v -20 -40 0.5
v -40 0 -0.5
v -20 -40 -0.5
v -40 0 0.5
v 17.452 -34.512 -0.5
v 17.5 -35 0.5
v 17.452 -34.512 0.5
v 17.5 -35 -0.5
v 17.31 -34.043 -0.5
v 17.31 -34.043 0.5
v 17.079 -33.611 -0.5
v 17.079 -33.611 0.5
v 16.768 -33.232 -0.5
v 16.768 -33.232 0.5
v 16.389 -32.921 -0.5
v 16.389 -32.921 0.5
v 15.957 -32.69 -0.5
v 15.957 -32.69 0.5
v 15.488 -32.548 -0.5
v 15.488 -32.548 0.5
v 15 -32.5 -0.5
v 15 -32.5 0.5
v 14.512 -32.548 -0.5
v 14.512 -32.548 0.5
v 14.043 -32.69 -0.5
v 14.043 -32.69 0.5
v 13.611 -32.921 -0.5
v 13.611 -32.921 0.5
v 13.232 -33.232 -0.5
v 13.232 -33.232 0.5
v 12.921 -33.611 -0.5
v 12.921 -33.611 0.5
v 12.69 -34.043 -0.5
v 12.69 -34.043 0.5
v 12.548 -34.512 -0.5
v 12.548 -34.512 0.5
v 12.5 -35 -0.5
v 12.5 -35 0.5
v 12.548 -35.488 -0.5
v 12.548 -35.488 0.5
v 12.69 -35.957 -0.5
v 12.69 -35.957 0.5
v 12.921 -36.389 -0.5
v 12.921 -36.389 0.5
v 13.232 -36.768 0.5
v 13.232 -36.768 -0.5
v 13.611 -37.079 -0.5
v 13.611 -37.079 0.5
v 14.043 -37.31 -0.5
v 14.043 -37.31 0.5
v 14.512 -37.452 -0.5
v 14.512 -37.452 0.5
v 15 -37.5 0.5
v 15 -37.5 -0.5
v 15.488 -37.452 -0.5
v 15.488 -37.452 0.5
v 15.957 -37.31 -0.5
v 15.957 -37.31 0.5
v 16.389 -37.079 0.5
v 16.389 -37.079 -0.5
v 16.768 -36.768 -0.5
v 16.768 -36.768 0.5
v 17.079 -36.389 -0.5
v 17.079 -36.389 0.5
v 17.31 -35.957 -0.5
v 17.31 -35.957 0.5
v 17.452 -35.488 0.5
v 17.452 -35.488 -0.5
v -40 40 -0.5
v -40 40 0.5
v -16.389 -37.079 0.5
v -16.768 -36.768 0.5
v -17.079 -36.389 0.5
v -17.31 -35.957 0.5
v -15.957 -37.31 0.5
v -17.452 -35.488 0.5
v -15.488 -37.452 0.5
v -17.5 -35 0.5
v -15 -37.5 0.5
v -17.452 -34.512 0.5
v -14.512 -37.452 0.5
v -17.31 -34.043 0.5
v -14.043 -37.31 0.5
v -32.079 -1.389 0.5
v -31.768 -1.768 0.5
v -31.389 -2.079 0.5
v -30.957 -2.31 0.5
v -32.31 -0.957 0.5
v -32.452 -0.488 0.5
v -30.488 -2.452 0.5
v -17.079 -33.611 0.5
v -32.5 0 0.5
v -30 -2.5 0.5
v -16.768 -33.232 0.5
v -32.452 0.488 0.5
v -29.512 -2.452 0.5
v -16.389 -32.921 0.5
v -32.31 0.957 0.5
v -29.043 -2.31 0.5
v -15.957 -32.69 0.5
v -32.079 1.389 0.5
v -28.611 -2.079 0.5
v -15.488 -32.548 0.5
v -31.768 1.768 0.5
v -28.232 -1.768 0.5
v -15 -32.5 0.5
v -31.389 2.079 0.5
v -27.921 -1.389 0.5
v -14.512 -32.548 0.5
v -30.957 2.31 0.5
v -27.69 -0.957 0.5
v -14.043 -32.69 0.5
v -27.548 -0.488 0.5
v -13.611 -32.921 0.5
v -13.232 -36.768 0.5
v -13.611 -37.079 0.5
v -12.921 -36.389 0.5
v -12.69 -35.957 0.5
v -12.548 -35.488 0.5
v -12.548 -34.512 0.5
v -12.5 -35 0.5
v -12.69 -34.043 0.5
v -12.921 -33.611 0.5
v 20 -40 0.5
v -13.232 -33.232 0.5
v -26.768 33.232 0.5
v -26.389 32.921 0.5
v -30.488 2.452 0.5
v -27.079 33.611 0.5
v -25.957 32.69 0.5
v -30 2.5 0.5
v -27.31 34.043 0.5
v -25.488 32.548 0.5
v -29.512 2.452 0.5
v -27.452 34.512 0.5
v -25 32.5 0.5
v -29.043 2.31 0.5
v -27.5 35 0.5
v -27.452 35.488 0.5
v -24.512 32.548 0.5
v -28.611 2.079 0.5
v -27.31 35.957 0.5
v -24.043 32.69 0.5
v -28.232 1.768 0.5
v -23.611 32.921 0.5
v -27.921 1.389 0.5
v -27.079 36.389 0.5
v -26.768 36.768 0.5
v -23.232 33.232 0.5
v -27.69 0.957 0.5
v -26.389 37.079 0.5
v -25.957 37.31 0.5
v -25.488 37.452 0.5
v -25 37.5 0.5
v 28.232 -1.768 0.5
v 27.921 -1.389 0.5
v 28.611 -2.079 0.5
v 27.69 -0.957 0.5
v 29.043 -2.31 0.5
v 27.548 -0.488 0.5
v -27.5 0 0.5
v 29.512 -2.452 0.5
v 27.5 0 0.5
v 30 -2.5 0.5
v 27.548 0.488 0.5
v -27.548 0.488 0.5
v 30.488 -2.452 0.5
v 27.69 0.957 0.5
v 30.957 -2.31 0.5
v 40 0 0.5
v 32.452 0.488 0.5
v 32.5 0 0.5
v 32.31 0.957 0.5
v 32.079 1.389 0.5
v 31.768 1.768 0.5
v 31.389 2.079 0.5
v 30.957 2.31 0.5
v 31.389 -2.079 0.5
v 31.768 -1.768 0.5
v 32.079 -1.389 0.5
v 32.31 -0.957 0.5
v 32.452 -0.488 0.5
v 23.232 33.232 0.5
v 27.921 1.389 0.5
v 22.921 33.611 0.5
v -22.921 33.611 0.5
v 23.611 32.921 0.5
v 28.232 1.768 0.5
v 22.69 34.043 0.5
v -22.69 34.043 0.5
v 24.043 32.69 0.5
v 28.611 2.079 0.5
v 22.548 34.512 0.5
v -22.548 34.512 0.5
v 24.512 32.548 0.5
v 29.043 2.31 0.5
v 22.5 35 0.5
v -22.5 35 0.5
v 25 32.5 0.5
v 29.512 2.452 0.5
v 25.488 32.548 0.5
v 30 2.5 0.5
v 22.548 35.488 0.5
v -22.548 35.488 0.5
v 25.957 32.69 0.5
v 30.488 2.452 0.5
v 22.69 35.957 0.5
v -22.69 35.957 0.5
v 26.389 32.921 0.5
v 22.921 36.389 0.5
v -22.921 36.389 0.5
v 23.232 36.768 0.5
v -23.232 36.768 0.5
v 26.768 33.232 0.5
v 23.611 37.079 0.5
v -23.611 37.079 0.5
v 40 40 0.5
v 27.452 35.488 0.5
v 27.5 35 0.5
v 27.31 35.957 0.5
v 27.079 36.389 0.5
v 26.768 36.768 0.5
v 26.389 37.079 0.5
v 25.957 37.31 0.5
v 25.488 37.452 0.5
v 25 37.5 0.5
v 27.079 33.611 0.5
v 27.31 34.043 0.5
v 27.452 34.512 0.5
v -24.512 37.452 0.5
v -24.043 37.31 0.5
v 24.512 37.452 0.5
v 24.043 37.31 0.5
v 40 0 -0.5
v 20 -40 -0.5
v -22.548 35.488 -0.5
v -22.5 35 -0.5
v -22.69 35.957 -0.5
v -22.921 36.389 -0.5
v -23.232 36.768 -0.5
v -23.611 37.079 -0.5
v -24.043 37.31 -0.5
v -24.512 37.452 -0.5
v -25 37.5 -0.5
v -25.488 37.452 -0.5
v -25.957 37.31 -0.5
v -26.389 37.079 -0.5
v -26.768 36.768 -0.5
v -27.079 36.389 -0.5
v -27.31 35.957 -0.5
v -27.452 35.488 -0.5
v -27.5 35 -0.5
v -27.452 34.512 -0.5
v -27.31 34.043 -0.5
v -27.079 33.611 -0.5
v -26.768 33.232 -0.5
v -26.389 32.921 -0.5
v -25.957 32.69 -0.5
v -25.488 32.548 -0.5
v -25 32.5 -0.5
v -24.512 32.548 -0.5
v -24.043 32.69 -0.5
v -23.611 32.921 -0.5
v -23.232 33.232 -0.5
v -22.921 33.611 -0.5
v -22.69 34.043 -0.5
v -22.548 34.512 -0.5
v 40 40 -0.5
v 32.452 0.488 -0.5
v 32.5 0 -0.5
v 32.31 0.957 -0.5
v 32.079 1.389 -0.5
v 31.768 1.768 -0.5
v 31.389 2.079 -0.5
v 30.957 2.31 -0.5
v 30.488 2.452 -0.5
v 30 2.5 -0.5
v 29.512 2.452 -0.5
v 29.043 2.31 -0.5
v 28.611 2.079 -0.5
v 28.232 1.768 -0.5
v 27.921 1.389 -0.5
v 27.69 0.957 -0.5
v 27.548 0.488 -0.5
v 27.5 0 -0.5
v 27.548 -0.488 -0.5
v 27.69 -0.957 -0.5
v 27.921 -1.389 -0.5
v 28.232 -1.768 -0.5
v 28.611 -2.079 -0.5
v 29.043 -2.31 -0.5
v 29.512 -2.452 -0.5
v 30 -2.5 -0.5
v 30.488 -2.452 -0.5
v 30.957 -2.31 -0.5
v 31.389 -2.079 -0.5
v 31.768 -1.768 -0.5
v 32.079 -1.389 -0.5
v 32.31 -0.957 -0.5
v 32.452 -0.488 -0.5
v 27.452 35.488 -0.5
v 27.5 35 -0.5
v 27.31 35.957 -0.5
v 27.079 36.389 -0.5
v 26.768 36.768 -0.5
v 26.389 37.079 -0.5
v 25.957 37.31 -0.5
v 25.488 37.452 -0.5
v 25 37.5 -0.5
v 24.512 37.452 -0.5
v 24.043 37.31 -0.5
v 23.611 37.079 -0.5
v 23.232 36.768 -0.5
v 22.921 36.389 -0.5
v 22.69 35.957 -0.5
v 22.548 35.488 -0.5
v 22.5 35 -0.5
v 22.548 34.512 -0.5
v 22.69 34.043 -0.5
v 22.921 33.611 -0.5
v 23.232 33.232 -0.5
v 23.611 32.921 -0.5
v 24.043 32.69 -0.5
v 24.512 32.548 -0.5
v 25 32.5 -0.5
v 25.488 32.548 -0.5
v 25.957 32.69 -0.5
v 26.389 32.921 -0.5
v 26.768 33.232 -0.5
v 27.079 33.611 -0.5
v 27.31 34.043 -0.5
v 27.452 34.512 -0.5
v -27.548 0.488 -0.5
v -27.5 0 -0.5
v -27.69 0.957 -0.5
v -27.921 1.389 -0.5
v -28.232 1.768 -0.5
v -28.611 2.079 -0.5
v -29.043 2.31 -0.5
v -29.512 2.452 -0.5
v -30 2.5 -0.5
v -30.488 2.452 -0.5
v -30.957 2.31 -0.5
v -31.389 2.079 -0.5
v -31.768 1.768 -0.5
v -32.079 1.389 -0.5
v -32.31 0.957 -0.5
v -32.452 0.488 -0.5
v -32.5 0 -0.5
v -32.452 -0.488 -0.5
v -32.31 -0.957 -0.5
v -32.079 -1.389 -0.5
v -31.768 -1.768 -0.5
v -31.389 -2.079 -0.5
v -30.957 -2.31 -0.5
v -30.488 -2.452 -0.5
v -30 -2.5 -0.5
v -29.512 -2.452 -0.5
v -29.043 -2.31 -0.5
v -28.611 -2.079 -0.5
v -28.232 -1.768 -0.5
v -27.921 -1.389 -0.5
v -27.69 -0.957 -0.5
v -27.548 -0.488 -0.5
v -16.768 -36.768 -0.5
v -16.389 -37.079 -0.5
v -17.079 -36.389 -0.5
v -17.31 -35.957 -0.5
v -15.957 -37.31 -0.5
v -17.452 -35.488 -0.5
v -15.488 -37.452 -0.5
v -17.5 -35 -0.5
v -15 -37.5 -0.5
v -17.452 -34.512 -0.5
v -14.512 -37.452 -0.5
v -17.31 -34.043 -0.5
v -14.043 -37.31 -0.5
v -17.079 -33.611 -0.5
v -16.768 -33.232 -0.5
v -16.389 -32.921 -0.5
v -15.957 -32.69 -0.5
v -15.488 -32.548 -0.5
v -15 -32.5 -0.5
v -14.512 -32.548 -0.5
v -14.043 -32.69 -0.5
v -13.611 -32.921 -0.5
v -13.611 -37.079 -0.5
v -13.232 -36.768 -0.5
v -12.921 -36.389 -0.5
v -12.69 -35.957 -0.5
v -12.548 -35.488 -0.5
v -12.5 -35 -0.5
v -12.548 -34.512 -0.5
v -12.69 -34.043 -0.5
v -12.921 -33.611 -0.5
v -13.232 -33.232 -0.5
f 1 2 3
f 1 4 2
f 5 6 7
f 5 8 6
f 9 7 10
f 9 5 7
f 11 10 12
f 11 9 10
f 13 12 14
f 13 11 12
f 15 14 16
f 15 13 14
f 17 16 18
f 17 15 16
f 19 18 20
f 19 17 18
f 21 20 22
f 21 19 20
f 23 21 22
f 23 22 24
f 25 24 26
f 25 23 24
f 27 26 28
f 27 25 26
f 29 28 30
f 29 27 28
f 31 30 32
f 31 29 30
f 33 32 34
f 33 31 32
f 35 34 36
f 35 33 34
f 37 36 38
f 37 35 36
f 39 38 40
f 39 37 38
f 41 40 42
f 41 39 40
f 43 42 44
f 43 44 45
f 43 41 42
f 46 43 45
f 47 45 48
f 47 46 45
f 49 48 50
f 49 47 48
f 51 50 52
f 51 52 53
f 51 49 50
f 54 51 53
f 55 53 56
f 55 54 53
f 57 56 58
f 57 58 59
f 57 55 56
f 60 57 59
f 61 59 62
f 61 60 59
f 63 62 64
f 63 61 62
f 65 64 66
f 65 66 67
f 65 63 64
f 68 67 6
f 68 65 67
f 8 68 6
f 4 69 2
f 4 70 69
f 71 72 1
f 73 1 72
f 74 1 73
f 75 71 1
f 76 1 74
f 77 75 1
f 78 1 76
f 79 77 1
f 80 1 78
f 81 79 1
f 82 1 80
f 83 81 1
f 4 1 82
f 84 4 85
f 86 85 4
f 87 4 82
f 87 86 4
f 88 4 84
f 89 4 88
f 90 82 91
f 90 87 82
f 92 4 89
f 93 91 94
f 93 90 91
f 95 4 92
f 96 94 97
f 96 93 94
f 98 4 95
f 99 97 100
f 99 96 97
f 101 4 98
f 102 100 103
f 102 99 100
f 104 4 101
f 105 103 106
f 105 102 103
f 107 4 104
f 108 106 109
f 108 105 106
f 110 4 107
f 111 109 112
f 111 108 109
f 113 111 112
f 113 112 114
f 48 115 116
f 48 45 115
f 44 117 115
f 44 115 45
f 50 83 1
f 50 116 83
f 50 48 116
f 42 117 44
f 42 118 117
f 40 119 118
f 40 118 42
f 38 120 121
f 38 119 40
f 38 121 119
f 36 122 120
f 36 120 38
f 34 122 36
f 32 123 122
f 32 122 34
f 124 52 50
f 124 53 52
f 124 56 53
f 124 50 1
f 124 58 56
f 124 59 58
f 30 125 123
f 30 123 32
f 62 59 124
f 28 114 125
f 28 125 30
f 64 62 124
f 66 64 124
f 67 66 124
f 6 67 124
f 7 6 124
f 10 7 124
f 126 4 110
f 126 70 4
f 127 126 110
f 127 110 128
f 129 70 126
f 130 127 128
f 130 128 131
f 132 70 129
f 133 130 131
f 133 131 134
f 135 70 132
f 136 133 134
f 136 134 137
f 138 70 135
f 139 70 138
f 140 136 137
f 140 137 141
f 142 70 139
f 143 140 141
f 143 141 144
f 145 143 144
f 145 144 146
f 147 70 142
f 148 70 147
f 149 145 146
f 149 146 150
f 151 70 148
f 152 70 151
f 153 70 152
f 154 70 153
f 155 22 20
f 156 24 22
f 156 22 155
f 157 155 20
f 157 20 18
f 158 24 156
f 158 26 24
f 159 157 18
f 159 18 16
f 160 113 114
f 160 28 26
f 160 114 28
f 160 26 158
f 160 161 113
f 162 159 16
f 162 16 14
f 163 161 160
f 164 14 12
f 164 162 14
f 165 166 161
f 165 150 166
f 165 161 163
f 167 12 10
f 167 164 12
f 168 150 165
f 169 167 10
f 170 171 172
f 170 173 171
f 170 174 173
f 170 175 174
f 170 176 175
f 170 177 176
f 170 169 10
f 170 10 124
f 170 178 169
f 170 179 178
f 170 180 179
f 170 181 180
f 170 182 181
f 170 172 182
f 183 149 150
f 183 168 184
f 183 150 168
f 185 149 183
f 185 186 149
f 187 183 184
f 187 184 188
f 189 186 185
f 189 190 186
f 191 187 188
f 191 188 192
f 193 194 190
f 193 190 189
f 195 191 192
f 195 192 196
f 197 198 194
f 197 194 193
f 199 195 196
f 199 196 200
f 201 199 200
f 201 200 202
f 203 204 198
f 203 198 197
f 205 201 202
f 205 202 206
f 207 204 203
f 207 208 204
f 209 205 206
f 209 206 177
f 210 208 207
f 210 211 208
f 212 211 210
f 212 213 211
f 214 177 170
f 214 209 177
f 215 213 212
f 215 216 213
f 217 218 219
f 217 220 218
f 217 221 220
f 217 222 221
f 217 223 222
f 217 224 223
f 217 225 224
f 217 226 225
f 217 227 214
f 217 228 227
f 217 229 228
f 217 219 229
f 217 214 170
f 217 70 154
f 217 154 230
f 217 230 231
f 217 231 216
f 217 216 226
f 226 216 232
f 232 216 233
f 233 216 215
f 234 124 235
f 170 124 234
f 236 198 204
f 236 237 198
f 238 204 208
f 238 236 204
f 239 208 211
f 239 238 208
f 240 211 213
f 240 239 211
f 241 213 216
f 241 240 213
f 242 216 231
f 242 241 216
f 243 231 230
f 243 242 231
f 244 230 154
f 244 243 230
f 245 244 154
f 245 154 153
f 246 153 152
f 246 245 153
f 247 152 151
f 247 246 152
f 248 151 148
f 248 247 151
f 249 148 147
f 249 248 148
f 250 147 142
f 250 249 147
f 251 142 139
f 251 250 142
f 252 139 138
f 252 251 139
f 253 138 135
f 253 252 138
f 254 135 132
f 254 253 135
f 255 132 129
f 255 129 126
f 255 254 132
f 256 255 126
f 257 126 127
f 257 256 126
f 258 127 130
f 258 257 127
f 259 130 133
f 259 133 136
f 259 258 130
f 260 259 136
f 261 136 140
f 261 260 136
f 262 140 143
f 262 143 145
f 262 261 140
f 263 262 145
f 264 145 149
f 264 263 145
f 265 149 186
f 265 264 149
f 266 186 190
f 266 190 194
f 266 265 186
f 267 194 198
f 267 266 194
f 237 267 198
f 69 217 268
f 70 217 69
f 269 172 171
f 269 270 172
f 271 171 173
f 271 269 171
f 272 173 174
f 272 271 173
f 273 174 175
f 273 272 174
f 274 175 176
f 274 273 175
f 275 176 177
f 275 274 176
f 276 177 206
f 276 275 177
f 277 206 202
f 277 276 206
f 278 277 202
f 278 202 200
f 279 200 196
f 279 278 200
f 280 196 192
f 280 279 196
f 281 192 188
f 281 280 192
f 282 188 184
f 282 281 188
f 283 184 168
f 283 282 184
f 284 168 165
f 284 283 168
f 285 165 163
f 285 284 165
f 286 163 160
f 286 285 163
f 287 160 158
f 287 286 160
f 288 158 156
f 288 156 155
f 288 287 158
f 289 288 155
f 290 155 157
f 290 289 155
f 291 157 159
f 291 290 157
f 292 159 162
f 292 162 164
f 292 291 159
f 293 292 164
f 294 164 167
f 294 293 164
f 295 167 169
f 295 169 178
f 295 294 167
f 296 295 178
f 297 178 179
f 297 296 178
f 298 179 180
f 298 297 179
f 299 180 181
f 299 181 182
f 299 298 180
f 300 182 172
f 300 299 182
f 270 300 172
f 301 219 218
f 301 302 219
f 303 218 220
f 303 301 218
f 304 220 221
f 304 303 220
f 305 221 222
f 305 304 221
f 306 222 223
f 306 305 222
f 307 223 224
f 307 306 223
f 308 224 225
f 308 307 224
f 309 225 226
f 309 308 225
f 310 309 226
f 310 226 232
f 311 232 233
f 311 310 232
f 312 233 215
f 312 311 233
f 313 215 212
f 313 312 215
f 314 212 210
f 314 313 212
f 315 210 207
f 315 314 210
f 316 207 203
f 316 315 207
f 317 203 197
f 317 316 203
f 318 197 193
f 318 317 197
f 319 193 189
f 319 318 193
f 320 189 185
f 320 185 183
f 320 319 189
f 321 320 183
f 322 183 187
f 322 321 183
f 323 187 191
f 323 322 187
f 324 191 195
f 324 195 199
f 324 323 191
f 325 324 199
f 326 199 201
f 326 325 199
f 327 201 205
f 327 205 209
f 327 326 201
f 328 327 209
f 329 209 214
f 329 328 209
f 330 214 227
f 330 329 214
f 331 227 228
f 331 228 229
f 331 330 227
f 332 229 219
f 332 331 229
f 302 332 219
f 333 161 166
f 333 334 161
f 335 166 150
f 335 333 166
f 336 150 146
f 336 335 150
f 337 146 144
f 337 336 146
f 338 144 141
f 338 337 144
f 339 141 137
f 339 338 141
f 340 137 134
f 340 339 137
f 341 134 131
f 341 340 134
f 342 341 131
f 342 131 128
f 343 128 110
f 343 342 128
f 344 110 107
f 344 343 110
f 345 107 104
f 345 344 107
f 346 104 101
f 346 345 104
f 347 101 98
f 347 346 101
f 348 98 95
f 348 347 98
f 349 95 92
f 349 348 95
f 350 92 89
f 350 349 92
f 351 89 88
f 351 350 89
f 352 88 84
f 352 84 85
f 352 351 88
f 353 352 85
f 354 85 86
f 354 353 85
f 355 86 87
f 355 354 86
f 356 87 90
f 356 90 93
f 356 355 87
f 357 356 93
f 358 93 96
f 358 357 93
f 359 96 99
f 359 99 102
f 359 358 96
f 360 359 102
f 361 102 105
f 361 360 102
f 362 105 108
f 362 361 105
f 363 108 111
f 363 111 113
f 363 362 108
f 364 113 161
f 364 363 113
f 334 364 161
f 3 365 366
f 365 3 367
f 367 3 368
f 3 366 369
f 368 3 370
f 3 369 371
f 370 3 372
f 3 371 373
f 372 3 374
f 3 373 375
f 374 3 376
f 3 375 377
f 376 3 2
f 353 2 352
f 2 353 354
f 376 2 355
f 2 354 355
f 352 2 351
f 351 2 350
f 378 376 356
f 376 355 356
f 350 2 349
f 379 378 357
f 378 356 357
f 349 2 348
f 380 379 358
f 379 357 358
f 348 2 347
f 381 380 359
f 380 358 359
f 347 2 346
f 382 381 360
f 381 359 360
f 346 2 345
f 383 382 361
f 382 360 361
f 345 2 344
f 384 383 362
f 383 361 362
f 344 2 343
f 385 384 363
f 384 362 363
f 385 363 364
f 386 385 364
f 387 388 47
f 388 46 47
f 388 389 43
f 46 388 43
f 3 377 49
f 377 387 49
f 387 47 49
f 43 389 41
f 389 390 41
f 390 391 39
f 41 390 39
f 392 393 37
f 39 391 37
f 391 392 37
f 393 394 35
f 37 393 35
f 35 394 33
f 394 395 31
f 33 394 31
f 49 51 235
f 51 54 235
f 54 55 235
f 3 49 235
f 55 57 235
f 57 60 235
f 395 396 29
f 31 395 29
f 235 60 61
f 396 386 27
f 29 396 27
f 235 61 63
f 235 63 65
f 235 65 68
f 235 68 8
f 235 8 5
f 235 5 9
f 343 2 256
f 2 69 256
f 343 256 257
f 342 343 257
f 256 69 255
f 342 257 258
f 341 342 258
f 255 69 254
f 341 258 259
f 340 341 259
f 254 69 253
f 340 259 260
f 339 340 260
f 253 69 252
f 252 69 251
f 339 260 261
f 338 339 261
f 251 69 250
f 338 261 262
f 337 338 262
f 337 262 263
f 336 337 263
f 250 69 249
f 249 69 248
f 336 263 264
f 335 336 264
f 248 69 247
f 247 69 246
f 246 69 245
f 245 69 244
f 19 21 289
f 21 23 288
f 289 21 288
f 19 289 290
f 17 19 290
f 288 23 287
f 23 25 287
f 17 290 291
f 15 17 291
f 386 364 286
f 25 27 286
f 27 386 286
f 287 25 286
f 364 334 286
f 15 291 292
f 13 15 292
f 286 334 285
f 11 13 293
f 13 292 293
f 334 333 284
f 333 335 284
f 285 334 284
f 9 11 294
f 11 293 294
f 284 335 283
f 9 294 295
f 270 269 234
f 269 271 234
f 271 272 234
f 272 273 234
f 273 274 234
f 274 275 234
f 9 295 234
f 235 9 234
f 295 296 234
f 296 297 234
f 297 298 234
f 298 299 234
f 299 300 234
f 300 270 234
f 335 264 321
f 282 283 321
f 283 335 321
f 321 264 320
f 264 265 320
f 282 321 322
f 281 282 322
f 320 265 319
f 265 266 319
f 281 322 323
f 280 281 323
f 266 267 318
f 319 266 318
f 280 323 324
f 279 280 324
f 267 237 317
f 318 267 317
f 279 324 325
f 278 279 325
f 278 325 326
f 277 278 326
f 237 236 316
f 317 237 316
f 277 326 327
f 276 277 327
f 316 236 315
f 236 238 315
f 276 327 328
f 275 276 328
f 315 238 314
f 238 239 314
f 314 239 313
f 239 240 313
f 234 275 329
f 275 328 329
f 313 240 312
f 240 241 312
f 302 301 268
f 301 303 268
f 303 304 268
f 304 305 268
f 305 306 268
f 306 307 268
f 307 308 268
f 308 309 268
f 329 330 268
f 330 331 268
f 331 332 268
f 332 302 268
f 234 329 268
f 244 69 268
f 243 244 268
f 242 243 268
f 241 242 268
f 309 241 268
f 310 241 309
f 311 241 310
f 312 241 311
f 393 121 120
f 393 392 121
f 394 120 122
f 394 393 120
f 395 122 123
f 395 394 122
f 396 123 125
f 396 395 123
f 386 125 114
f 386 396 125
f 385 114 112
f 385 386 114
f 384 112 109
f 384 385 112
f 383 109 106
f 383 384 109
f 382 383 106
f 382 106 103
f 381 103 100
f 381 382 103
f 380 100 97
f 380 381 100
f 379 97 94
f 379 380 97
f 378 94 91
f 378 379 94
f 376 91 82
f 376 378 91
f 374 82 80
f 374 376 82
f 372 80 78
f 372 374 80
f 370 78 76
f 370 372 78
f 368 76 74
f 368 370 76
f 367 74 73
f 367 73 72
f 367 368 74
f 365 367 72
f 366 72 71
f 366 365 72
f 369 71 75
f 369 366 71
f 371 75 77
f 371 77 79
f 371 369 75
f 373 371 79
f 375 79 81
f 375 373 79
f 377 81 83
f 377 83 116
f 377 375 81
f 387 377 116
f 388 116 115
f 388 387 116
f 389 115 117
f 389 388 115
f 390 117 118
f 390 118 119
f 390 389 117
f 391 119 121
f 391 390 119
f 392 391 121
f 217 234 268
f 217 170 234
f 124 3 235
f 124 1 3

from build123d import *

# Parameters (mm, degrees)
SKETCH1_R           = 2.5
BOSS_EXTRUDE1_DEPTH = 0.5


with BuildPart() as part:
    # Sketch1 → Boss-Extrude1 (new, symmetric)
    # profile 1 of 2: a face of its own
    with BuildSketch(Plane.XY):
        Polygon((0, 40), (0, -40), (20, -40), (40, 0), (40, 40), align=None)
        with Locations((15, -35)):
            Circle(SKETCH1_R, mode=Mode.SUBTRACT)
        with Locations((30, 0)):
            Circle(SKETCH1_R, mode=Mode.SUBTRACT)
        with Locations((25, 35)):
            Circle(SKETCH1_R, mode=Mode.SUBTRACT)
    # profile 2 of 2: a face of its own
    with BuildSketch(Plane.XY):
        Polygon((-20, -40), (0, -40), (0, 40), (-40, 40), (-40, 0), align=None)
        with Locations((-15, -35)):
            Circle(SKETCH1_R, mode=Mode.SUBTRACT)
        with Locations((-30, 0)):
            Circle(SKETCH1_R, mode=Mode.SUBTRACT)
        with Locations((-25, 35)):
            Circle(SKETCH1_R, mode=Mode.SUBTRACT)
    extrude(amount=BOSS_EXTRUDE1_DEPTH, both=True)


solid = part.part
